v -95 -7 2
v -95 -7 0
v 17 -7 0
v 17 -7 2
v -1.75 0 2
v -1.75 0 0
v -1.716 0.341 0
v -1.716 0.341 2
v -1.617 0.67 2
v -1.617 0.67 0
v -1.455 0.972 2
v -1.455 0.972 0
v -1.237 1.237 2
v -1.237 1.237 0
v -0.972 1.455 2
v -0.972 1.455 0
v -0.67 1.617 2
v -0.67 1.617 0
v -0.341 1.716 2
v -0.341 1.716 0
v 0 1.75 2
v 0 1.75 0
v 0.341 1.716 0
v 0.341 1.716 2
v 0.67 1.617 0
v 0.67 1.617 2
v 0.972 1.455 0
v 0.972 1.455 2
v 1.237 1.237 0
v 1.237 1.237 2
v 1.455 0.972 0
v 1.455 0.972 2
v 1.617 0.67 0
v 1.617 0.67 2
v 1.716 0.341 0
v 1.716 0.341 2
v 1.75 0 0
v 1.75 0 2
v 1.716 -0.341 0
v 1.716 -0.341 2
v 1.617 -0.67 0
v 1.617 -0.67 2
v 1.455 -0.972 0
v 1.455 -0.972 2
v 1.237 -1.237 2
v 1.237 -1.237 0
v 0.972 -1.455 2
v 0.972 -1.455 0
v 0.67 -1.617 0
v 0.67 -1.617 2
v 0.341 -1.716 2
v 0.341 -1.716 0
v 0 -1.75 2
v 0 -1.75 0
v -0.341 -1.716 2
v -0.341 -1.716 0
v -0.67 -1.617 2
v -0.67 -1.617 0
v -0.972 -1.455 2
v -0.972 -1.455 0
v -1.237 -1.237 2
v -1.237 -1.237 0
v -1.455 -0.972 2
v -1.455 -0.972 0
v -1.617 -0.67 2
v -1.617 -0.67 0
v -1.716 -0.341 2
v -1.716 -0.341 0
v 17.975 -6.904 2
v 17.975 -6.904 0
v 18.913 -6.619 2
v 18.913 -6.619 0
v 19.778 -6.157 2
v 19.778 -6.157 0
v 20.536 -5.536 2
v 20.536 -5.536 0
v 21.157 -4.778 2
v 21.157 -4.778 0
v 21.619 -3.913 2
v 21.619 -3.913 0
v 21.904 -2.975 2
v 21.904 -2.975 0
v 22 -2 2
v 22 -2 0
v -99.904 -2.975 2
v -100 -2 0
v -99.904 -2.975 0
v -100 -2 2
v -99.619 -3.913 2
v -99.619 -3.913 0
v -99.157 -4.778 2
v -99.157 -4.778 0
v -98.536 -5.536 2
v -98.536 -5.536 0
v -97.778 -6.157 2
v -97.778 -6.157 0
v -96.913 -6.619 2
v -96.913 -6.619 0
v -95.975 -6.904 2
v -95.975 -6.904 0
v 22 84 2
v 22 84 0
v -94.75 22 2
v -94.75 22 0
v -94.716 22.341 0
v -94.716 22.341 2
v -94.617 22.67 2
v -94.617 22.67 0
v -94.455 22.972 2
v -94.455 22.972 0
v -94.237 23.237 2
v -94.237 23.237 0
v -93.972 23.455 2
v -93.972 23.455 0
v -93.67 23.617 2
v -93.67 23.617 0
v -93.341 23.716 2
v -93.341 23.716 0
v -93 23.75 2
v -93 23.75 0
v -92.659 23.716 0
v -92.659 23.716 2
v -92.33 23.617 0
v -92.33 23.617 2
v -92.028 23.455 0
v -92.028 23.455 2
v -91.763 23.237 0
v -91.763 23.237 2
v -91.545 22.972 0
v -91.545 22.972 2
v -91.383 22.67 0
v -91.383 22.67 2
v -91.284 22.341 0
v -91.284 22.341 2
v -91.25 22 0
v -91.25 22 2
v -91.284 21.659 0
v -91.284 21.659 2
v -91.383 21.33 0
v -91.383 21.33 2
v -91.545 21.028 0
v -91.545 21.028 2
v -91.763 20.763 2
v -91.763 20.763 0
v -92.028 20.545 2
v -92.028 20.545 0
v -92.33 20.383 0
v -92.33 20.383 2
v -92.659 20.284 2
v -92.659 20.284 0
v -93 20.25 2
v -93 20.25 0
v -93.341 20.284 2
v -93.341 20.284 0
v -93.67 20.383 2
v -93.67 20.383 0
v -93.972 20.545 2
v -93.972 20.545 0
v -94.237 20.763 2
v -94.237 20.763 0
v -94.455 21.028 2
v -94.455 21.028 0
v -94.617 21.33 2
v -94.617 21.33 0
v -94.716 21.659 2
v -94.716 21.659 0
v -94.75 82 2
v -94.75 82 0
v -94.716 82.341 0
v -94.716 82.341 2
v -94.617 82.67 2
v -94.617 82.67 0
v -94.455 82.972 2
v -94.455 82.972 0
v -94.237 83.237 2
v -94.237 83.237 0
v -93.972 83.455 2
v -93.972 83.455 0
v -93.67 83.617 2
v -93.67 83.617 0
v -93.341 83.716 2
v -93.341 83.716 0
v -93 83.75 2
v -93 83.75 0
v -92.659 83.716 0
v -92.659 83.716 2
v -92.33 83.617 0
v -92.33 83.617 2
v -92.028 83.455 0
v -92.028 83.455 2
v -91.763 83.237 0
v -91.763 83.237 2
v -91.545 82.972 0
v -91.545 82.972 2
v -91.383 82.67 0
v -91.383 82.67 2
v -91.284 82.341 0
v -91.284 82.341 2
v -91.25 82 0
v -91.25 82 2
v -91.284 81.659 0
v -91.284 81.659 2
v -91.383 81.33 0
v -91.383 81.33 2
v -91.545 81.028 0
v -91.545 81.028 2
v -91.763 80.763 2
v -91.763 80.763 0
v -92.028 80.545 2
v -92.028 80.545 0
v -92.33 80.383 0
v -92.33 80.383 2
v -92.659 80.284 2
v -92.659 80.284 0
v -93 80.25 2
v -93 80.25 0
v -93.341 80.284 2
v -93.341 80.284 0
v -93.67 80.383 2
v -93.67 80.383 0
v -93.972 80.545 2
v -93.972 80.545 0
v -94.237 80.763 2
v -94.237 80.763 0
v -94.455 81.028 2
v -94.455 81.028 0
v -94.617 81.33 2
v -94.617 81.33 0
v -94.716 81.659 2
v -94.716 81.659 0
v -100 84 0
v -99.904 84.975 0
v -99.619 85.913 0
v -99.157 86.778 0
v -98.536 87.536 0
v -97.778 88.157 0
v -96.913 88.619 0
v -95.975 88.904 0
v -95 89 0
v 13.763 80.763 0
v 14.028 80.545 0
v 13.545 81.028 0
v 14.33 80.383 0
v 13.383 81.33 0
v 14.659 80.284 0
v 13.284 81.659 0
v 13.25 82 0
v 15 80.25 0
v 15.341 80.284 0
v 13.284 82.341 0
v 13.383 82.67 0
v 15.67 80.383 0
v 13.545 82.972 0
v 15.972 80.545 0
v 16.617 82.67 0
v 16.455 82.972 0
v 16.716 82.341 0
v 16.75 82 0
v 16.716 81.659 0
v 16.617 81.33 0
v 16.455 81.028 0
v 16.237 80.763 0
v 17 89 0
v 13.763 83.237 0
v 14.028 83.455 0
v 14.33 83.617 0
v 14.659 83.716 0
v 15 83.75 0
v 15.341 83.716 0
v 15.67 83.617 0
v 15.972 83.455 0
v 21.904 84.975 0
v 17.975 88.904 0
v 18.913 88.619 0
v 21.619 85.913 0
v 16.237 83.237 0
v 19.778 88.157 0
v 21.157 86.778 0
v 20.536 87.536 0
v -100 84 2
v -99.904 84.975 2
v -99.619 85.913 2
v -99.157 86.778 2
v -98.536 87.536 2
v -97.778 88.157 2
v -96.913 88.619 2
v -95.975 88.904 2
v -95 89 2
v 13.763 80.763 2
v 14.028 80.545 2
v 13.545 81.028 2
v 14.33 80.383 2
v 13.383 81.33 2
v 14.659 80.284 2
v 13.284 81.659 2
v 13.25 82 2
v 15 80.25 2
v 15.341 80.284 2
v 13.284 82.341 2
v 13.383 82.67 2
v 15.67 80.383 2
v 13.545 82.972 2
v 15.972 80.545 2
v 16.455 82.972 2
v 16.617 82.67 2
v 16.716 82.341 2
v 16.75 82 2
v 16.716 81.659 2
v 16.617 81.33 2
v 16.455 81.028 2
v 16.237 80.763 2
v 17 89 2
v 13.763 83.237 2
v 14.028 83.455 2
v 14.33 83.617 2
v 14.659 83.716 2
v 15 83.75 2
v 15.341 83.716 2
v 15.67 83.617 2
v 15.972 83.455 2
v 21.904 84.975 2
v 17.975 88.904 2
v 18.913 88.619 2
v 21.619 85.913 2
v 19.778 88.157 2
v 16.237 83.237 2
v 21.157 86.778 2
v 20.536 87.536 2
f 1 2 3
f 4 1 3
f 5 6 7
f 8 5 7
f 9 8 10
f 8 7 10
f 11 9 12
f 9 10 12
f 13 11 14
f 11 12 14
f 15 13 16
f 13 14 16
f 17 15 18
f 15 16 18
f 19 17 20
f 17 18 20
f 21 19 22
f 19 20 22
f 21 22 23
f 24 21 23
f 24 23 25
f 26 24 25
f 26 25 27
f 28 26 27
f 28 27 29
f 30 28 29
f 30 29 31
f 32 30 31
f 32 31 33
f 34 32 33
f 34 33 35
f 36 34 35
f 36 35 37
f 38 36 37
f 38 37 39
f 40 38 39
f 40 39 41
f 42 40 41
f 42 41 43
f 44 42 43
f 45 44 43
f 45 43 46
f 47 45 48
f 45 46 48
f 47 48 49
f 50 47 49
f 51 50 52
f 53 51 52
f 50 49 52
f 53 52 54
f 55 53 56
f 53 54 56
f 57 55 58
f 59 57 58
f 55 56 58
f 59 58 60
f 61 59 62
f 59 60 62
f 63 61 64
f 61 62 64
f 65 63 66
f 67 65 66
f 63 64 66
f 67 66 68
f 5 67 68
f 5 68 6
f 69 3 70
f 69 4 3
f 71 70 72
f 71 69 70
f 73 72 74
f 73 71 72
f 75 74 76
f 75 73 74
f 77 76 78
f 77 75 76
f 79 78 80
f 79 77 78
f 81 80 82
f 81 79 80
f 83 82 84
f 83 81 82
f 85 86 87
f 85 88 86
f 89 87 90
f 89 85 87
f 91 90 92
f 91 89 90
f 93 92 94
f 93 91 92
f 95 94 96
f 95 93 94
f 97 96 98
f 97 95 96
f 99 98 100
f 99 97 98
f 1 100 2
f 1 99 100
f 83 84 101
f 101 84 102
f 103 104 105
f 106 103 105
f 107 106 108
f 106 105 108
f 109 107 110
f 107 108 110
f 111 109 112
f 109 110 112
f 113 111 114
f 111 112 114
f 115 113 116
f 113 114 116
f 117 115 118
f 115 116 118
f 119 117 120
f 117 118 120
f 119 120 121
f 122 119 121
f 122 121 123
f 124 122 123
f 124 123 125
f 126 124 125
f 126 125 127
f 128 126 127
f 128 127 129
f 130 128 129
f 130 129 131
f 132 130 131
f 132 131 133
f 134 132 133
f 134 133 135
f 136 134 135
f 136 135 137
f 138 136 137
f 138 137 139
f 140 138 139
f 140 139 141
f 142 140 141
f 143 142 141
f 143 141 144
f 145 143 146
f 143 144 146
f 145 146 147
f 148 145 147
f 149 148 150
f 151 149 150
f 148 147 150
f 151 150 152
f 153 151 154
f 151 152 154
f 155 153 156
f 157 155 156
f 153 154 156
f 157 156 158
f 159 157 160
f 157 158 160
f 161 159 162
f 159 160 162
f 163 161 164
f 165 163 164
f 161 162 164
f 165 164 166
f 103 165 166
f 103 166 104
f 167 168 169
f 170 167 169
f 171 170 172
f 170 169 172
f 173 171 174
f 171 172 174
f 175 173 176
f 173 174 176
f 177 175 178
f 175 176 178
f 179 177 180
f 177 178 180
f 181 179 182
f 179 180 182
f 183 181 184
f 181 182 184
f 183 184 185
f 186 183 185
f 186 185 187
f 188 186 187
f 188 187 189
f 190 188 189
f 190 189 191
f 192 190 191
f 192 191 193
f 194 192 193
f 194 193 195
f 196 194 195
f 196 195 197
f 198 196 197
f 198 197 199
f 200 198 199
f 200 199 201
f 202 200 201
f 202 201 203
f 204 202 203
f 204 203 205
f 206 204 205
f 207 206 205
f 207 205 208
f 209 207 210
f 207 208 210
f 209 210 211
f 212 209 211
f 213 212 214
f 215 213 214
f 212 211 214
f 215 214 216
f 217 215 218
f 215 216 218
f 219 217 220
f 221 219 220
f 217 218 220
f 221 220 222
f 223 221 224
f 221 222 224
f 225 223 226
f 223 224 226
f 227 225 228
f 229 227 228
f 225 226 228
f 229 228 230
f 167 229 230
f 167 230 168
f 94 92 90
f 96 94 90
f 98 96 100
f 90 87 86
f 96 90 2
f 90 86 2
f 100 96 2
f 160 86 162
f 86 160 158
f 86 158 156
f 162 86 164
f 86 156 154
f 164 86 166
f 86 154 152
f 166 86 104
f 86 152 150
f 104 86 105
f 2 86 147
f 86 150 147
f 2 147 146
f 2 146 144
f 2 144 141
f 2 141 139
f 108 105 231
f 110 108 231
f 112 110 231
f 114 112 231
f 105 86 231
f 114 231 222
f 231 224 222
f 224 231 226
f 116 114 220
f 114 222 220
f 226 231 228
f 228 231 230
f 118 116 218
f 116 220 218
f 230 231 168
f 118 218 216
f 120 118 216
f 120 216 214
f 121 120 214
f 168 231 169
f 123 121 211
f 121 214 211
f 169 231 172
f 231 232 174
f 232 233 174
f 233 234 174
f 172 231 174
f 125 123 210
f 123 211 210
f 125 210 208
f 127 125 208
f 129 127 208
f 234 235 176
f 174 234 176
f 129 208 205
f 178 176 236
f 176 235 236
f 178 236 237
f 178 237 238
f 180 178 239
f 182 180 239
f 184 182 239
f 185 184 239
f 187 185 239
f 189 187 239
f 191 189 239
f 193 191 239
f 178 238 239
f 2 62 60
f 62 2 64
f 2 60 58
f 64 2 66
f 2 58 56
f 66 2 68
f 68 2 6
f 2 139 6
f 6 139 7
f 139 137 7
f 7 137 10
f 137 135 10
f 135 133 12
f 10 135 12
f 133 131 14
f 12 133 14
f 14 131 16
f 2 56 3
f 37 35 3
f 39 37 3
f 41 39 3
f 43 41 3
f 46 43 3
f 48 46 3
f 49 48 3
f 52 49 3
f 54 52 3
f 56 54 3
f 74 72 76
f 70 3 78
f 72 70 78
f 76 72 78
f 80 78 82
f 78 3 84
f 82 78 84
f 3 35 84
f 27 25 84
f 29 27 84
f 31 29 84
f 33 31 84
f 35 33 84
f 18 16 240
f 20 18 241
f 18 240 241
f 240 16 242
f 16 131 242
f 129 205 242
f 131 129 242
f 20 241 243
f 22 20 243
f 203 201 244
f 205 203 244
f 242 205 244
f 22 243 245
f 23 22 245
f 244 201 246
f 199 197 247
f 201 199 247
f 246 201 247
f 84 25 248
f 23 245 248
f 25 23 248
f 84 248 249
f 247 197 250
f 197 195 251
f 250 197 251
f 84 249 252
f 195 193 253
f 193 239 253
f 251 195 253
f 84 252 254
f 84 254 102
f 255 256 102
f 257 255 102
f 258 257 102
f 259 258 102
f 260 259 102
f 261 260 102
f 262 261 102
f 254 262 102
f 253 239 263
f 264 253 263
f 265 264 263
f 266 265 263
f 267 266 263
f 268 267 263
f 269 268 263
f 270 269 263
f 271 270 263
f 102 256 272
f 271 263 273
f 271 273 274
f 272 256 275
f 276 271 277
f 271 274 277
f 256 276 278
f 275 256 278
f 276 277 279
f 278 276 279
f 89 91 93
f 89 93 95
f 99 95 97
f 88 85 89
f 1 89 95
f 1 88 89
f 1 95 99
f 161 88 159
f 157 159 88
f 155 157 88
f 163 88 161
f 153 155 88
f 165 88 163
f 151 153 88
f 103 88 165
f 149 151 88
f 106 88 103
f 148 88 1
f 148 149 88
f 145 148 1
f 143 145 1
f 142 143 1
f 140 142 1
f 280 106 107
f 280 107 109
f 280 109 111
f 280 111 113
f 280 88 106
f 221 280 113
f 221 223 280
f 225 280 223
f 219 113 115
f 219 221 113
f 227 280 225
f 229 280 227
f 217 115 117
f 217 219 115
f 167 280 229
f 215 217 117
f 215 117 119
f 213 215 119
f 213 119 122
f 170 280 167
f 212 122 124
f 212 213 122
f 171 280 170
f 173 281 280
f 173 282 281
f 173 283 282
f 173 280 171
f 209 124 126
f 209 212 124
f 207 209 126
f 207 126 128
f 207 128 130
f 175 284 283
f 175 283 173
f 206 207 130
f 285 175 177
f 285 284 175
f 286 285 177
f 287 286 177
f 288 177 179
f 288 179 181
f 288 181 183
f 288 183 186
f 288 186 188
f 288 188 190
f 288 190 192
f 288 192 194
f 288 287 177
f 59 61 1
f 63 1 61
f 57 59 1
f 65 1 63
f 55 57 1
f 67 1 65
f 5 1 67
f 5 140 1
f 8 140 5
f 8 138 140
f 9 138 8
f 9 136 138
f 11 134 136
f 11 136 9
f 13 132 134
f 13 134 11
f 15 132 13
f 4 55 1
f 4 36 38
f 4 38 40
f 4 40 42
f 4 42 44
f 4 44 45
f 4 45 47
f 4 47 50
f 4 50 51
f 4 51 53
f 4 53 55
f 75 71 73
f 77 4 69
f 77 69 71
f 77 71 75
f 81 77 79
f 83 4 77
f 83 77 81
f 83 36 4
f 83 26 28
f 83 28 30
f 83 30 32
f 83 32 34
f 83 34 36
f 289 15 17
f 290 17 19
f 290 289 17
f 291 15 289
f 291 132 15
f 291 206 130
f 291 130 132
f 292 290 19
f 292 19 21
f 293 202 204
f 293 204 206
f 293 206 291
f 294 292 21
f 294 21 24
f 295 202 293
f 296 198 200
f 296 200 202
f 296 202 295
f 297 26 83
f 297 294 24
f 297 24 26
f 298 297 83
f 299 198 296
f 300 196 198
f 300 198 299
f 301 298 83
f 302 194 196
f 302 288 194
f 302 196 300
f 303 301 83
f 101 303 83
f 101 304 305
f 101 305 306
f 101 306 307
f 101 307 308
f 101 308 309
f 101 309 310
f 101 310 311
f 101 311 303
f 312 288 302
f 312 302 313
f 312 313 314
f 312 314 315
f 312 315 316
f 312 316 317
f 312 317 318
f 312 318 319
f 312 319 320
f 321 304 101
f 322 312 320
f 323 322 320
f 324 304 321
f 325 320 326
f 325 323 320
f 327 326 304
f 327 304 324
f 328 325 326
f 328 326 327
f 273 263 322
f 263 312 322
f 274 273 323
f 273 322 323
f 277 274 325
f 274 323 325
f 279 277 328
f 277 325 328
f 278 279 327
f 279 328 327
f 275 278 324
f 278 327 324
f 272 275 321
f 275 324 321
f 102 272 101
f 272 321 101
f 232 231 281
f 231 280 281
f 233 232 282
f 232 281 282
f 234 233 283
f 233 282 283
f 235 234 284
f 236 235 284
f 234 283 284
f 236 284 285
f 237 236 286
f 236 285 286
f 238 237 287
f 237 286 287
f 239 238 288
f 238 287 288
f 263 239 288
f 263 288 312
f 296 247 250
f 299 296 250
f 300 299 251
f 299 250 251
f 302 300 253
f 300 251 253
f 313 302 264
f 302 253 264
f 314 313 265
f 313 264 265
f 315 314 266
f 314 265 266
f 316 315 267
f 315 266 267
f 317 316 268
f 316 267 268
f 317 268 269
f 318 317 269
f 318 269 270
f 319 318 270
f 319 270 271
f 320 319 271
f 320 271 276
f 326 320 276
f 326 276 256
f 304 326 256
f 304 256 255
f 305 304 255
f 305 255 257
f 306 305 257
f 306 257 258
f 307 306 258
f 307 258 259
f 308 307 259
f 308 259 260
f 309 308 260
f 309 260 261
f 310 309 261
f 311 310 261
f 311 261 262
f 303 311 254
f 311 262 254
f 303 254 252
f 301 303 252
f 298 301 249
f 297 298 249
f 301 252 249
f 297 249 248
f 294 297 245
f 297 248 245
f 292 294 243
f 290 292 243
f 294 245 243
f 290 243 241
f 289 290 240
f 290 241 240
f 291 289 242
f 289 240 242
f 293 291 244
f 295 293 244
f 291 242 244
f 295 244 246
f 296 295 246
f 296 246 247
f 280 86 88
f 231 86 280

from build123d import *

# Parameters (mm, degrees)
SKETCH1_W                  = 122
SKETCH1_H                  = 96
BOSS_EXTRUDE1_DEPTH        = 2
F_3_5_3_5_DIAMETER_HOLE1_D = 3.5
FILLET1_R                  = 5


with BuildPart() as part:
    # Sketch1 → Boss-Extrude1 (new body)
    with BuildSketch(Plane.XY):
        with Locations((-39, 41)):
            Rectangle(SKETCH1_W, SKETCH1_H)
    extrude(amount=BOSS_EXTRUDE1_DEPTH)

    # Ø3.5 (3.5) Diameter Hole1 (through all)
    with Locations(Plane.XY.offset(2)):
        with Locations((0, 0), (15, 82), (-93, 82), (-93, 22)):
            Hole(F_3_5_3_5_DIAMETER_HOLE1_D / 2)

    # Fillet1
    fillet1_edges = [part.edges().sort_by_distance(p)[0] for p in [
        (-100, 89, 1),
        (22, 89, 1),
        (22, -7, 1),
        (-100, -7, 1),
    ]]
    fillet(fillet1_edges, radius=FILLET1_R)


solid = part.part
